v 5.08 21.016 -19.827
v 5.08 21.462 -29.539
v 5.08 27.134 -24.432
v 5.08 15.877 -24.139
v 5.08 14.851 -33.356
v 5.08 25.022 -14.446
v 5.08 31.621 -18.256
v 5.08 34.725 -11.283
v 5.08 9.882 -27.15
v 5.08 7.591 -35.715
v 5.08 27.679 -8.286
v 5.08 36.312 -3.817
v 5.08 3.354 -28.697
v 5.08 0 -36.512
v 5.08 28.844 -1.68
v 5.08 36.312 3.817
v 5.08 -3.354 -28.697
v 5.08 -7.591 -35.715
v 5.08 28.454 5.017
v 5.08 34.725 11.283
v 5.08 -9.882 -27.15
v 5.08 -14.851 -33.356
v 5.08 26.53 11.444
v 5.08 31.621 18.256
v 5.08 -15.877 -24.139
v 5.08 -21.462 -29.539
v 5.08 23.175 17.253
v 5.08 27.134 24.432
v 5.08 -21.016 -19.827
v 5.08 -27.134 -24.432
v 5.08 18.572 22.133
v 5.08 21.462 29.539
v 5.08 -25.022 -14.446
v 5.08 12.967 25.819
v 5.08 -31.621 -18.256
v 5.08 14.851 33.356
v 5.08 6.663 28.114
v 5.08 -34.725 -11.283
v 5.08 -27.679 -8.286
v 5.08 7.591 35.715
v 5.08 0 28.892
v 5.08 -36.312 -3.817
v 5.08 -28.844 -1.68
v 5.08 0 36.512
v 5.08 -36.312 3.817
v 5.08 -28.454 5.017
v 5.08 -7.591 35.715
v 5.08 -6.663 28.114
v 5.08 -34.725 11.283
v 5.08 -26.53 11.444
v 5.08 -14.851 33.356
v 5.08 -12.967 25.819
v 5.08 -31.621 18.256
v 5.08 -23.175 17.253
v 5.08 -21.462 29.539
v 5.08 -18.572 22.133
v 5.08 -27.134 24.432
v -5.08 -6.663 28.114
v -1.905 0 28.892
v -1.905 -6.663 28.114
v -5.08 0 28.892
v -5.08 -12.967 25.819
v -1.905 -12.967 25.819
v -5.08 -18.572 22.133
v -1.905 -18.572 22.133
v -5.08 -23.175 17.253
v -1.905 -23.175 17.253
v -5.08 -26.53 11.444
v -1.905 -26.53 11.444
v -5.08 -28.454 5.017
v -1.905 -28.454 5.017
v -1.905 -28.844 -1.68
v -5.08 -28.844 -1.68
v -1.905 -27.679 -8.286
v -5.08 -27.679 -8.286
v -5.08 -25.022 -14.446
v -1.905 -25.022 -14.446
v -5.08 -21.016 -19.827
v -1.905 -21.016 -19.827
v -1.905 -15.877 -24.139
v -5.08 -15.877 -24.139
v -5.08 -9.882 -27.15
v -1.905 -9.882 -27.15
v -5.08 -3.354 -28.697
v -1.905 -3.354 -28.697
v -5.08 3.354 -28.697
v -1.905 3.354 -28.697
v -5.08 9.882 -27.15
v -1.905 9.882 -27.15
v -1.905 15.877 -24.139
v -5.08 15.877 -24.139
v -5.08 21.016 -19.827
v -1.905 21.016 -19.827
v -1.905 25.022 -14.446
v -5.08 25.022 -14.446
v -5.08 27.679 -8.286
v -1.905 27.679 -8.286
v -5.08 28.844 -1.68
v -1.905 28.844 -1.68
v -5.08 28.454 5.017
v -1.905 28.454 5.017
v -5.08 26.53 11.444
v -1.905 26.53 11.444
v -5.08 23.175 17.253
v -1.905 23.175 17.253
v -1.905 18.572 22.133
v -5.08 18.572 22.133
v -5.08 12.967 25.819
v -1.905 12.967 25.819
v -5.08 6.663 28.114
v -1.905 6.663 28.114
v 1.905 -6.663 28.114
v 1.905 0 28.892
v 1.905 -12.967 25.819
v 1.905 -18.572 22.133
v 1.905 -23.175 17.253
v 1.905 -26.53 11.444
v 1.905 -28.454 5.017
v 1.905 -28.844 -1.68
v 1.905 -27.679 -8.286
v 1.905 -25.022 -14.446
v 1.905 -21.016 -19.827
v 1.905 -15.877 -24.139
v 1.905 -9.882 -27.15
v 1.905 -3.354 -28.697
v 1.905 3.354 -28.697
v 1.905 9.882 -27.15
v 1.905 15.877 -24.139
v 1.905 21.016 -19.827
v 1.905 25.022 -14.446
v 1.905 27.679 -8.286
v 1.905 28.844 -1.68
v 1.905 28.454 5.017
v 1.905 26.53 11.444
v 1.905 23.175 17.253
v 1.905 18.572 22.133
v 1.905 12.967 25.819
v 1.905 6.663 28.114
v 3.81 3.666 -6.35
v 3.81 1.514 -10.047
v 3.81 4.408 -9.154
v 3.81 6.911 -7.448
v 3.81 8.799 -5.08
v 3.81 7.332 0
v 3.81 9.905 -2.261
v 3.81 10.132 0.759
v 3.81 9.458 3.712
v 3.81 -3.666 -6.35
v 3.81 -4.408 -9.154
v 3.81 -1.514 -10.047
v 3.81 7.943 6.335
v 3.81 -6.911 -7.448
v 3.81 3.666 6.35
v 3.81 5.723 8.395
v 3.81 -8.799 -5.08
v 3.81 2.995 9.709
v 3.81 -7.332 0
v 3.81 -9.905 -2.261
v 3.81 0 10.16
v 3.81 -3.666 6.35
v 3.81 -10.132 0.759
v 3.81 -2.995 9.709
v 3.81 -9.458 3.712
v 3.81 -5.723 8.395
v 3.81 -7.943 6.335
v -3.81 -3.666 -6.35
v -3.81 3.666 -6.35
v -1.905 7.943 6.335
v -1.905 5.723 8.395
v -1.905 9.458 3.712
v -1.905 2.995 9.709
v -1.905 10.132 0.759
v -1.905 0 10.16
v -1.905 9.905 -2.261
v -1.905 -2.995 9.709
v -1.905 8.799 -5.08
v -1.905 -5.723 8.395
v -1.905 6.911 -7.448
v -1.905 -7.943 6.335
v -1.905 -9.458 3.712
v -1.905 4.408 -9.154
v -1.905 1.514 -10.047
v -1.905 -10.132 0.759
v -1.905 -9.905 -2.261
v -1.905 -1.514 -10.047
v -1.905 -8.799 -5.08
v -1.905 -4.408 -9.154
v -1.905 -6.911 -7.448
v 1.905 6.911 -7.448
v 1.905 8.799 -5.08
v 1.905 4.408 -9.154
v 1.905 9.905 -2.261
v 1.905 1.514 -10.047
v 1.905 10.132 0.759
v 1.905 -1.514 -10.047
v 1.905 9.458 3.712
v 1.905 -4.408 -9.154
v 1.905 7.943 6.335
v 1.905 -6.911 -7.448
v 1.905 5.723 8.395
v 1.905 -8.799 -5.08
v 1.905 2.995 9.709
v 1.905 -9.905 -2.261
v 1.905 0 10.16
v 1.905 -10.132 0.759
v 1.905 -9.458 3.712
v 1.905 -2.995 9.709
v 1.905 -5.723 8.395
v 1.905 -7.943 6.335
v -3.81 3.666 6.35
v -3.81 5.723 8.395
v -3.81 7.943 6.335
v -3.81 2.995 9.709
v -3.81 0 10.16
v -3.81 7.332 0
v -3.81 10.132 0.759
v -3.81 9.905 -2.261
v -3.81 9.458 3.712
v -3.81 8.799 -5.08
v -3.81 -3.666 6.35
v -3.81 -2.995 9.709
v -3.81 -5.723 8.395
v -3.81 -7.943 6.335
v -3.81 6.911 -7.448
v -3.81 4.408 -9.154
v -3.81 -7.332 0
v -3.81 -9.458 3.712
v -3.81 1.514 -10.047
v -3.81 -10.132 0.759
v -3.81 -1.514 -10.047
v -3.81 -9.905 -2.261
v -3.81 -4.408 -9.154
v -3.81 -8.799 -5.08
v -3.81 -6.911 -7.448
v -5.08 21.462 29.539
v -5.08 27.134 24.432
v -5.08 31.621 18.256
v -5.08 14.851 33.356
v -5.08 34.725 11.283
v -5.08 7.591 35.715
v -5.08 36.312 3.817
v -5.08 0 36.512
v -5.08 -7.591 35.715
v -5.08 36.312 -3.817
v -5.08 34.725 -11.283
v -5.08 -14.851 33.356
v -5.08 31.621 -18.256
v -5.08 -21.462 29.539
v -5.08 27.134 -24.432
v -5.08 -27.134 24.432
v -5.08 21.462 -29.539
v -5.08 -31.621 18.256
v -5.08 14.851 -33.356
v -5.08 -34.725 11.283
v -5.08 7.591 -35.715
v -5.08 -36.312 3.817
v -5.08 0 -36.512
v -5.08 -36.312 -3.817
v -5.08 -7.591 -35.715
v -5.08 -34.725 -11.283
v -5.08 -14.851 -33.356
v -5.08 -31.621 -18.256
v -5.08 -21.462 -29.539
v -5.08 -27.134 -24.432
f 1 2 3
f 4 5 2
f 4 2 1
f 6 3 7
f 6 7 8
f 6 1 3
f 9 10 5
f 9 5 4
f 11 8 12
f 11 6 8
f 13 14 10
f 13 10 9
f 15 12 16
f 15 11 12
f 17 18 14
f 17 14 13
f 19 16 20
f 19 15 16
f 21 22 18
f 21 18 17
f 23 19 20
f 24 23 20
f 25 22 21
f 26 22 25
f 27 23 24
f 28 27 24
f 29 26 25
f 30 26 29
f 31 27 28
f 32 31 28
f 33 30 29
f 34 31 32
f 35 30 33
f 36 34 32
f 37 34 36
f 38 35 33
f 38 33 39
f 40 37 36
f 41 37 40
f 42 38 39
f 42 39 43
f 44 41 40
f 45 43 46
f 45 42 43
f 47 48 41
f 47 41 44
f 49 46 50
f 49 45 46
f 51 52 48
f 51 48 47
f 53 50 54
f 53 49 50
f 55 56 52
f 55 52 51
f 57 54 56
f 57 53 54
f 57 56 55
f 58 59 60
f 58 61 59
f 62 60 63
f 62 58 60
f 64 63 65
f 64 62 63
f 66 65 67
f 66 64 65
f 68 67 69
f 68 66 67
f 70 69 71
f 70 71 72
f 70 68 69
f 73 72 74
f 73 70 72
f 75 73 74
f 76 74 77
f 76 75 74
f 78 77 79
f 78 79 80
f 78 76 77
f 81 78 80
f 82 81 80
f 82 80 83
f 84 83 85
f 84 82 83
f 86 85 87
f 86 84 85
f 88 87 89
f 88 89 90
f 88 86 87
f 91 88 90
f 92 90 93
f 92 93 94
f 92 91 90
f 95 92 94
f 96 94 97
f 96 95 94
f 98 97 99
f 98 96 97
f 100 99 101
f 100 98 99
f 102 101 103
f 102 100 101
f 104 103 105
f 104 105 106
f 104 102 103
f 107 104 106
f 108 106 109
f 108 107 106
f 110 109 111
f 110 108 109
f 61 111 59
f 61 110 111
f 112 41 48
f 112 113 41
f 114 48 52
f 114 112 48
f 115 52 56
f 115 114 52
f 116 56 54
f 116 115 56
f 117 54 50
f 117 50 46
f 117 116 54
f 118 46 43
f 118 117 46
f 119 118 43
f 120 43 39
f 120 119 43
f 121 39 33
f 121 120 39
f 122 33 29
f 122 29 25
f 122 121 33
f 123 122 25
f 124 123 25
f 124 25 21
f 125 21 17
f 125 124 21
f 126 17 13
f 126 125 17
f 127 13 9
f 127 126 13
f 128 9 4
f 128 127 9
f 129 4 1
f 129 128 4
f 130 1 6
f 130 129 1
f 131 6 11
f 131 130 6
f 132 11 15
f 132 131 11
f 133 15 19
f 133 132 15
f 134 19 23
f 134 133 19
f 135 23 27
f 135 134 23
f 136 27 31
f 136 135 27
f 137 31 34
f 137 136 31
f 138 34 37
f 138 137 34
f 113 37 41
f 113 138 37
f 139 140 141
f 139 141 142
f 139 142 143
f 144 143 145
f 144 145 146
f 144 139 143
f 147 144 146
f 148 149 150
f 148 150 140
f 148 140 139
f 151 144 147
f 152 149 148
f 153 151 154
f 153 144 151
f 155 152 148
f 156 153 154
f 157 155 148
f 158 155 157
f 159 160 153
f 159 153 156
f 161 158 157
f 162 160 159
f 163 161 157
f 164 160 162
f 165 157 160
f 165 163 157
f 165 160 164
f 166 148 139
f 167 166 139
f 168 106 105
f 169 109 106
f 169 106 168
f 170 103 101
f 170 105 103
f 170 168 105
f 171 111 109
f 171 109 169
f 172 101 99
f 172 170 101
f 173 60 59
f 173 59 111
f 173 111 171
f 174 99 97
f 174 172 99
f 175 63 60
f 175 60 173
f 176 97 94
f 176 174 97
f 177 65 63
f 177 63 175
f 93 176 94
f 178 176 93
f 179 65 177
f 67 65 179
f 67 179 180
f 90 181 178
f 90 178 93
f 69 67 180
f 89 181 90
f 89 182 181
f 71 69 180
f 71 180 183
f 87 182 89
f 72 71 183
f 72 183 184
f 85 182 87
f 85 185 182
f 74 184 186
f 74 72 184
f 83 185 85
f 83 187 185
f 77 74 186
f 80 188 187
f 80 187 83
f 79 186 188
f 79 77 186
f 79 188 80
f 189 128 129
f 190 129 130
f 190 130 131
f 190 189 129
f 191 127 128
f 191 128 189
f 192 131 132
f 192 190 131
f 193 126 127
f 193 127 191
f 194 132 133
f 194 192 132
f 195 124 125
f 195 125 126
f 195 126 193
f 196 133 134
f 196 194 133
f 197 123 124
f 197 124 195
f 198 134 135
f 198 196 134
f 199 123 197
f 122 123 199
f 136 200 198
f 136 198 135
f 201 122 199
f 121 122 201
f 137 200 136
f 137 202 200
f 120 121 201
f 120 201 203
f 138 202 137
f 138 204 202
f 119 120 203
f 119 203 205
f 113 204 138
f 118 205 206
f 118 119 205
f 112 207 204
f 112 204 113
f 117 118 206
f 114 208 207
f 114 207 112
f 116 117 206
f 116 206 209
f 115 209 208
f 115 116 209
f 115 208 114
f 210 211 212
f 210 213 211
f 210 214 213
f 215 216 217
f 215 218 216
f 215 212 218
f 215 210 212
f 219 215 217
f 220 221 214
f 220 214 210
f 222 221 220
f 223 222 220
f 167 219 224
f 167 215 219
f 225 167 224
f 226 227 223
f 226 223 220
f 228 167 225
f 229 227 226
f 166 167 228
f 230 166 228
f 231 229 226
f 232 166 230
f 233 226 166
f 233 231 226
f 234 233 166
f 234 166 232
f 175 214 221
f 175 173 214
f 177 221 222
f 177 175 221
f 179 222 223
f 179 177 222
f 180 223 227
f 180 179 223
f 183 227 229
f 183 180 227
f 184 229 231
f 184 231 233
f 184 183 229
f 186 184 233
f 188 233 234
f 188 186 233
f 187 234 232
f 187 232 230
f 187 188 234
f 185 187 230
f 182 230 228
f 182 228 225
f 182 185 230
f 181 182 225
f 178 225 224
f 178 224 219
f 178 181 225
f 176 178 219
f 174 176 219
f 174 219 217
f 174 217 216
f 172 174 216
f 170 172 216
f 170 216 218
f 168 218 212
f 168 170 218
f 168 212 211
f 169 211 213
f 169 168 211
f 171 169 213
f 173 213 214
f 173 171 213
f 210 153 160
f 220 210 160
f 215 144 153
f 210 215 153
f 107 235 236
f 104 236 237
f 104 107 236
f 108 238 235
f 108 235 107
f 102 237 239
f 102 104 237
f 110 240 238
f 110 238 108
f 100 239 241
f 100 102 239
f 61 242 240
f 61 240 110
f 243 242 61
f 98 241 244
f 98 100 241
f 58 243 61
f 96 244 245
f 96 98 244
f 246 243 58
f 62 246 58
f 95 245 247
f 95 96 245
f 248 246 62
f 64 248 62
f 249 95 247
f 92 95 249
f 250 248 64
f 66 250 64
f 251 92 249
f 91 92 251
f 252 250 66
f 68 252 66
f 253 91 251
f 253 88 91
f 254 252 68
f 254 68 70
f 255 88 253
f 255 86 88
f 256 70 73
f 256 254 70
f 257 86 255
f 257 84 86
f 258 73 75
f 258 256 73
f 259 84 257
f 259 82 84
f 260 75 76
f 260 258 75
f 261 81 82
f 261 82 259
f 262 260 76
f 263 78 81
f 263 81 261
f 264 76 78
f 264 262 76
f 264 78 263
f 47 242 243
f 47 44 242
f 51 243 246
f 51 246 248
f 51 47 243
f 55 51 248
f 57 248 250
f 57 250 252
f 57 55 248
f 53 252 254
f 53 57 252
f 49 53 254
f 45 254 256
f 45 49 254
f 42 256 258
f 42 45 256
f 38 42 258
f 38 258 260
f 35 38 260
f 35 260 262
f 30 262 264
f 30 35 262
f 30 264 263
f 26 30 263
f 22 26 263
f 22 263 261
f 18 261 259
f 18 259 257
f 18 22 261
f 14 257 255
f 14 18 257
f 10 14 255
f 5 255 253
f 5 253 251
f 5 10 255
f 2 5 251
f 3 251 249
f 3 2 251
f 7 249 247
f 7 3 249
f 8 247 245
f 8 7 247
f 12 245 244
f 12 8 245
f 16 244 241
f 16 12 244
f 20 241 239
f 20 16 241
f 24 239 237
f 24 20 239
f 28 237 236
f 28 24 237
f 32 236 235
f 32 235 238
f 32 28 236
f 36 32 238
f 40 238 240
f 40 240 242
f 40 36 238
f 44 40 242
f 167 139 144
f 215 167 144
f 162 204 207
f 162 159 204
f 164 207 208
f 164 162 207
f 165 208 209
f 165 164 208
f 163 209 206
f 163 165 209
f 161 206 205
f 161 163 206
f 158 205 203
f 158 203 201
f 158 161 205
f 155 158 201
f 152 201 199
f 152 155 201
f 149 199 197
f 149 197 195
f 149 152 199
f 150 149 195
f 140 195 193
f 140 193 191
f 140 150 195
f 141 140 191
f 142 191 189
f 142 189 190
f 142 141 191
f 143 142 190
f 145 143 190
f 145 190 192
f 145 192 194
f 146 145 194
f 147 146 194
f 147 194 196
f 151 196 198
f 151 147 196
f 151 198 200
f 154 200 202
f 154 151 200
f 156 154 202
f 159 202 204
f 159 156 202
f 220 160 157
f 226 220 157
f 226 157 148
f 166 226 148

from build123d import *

# Parameters (mm, degrees)
ENL_V_MAT_EXTRU_1_DEPTH = 53.396158375


with BuildPart() as part:
    # Esquisse1 → Révolution1 (revolve)
    with BuildSketch(Plane.XY, mode=Mode.PRIVATE) as r_volution1_sk:
        Polygon((-5.08, 36.5125), (5.08, 36.5125), (5.08, 28.8925), (1.905, 28.8925), (1.905, 10.16), (3.81, 10.16), (3.81, 0), (-3.81, 0), (-3.81, 10.16), (-1.905, 10.16), (-1.905, 28.8925), (-5.08, 28.8925), align=None)
    revolve(r_volution1_sk.sketch.rotate(Axis((-12.56603466, 0, 0), (1, 0, 0)), 90), axis=Axis((-12.56603466, 0, 0), (1, 0, 0)))

    # Esquisse2 → Enlèv. mat.-Extru.1 (cut, through all)
    with BuildSketch(Plane(origin=(3.81, 0, 0), x_dir=(0, 0, -1), z_dir=(1, 0, 0))):
        Polygon((0, 7.332348419), (-6.35, 3.666174209), (-6.35, -3.666174209), (0, -7.332348419), (6.35, -3.666174209), (6.35, 3.666174209), align=None)
    extrude(amount=-ENL_V_MAT_EXTRU_1_DEPTH, mode=Mode.SUBTRACT)


solid = part.part
